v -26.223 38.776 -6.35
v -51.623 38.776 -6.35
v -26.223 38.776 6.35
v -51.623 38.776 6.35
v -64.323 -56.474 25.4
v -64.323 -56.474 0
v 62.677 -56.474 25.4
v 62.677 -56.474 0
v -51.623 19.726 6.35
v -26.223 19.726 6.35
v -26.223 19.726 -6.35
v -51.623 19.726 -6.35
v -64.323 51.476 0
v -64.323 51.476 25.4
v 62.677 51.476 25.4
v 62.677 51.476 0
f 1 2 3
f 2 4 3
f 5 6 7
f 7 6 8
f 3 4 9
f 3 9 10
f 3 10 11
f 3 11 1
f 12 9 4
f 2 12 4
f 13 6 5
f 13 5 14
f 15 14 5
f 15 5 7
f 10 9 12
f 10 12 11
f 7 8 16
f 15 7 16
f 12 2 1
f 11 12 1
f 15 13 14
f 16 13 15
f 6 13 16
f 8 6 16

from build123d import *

# Parameters (mm, degrees)
F0_W     = 127
F0_H     = 107.95
F1_DEPTH = 25.4
F2_W     = 25.4
F2_H     = 19.05
F3_DEPTH = 6.35


with BuildPart() as f1:
    # F0 (on Top) → F1 (new body)
    with BuildSketch(Plane.XY):
        with Locations((-0.822568, -2.498812)):
            Rectangle(F0_W, F0_H)
    extrude(amount=F1_DEPTH)


with BuildPart() as f3:
    # F2 (on Top) → F3 (new body, symmetric)
    with BuildSketch(Plane.XY):
        with Locations((-38.922568, 29.251188)):
            Rectangle(F2_W, F2_H)
    extrude(amount=F3_DEPTH, both=True)


solid = Compound([f1.part, f3.part])
